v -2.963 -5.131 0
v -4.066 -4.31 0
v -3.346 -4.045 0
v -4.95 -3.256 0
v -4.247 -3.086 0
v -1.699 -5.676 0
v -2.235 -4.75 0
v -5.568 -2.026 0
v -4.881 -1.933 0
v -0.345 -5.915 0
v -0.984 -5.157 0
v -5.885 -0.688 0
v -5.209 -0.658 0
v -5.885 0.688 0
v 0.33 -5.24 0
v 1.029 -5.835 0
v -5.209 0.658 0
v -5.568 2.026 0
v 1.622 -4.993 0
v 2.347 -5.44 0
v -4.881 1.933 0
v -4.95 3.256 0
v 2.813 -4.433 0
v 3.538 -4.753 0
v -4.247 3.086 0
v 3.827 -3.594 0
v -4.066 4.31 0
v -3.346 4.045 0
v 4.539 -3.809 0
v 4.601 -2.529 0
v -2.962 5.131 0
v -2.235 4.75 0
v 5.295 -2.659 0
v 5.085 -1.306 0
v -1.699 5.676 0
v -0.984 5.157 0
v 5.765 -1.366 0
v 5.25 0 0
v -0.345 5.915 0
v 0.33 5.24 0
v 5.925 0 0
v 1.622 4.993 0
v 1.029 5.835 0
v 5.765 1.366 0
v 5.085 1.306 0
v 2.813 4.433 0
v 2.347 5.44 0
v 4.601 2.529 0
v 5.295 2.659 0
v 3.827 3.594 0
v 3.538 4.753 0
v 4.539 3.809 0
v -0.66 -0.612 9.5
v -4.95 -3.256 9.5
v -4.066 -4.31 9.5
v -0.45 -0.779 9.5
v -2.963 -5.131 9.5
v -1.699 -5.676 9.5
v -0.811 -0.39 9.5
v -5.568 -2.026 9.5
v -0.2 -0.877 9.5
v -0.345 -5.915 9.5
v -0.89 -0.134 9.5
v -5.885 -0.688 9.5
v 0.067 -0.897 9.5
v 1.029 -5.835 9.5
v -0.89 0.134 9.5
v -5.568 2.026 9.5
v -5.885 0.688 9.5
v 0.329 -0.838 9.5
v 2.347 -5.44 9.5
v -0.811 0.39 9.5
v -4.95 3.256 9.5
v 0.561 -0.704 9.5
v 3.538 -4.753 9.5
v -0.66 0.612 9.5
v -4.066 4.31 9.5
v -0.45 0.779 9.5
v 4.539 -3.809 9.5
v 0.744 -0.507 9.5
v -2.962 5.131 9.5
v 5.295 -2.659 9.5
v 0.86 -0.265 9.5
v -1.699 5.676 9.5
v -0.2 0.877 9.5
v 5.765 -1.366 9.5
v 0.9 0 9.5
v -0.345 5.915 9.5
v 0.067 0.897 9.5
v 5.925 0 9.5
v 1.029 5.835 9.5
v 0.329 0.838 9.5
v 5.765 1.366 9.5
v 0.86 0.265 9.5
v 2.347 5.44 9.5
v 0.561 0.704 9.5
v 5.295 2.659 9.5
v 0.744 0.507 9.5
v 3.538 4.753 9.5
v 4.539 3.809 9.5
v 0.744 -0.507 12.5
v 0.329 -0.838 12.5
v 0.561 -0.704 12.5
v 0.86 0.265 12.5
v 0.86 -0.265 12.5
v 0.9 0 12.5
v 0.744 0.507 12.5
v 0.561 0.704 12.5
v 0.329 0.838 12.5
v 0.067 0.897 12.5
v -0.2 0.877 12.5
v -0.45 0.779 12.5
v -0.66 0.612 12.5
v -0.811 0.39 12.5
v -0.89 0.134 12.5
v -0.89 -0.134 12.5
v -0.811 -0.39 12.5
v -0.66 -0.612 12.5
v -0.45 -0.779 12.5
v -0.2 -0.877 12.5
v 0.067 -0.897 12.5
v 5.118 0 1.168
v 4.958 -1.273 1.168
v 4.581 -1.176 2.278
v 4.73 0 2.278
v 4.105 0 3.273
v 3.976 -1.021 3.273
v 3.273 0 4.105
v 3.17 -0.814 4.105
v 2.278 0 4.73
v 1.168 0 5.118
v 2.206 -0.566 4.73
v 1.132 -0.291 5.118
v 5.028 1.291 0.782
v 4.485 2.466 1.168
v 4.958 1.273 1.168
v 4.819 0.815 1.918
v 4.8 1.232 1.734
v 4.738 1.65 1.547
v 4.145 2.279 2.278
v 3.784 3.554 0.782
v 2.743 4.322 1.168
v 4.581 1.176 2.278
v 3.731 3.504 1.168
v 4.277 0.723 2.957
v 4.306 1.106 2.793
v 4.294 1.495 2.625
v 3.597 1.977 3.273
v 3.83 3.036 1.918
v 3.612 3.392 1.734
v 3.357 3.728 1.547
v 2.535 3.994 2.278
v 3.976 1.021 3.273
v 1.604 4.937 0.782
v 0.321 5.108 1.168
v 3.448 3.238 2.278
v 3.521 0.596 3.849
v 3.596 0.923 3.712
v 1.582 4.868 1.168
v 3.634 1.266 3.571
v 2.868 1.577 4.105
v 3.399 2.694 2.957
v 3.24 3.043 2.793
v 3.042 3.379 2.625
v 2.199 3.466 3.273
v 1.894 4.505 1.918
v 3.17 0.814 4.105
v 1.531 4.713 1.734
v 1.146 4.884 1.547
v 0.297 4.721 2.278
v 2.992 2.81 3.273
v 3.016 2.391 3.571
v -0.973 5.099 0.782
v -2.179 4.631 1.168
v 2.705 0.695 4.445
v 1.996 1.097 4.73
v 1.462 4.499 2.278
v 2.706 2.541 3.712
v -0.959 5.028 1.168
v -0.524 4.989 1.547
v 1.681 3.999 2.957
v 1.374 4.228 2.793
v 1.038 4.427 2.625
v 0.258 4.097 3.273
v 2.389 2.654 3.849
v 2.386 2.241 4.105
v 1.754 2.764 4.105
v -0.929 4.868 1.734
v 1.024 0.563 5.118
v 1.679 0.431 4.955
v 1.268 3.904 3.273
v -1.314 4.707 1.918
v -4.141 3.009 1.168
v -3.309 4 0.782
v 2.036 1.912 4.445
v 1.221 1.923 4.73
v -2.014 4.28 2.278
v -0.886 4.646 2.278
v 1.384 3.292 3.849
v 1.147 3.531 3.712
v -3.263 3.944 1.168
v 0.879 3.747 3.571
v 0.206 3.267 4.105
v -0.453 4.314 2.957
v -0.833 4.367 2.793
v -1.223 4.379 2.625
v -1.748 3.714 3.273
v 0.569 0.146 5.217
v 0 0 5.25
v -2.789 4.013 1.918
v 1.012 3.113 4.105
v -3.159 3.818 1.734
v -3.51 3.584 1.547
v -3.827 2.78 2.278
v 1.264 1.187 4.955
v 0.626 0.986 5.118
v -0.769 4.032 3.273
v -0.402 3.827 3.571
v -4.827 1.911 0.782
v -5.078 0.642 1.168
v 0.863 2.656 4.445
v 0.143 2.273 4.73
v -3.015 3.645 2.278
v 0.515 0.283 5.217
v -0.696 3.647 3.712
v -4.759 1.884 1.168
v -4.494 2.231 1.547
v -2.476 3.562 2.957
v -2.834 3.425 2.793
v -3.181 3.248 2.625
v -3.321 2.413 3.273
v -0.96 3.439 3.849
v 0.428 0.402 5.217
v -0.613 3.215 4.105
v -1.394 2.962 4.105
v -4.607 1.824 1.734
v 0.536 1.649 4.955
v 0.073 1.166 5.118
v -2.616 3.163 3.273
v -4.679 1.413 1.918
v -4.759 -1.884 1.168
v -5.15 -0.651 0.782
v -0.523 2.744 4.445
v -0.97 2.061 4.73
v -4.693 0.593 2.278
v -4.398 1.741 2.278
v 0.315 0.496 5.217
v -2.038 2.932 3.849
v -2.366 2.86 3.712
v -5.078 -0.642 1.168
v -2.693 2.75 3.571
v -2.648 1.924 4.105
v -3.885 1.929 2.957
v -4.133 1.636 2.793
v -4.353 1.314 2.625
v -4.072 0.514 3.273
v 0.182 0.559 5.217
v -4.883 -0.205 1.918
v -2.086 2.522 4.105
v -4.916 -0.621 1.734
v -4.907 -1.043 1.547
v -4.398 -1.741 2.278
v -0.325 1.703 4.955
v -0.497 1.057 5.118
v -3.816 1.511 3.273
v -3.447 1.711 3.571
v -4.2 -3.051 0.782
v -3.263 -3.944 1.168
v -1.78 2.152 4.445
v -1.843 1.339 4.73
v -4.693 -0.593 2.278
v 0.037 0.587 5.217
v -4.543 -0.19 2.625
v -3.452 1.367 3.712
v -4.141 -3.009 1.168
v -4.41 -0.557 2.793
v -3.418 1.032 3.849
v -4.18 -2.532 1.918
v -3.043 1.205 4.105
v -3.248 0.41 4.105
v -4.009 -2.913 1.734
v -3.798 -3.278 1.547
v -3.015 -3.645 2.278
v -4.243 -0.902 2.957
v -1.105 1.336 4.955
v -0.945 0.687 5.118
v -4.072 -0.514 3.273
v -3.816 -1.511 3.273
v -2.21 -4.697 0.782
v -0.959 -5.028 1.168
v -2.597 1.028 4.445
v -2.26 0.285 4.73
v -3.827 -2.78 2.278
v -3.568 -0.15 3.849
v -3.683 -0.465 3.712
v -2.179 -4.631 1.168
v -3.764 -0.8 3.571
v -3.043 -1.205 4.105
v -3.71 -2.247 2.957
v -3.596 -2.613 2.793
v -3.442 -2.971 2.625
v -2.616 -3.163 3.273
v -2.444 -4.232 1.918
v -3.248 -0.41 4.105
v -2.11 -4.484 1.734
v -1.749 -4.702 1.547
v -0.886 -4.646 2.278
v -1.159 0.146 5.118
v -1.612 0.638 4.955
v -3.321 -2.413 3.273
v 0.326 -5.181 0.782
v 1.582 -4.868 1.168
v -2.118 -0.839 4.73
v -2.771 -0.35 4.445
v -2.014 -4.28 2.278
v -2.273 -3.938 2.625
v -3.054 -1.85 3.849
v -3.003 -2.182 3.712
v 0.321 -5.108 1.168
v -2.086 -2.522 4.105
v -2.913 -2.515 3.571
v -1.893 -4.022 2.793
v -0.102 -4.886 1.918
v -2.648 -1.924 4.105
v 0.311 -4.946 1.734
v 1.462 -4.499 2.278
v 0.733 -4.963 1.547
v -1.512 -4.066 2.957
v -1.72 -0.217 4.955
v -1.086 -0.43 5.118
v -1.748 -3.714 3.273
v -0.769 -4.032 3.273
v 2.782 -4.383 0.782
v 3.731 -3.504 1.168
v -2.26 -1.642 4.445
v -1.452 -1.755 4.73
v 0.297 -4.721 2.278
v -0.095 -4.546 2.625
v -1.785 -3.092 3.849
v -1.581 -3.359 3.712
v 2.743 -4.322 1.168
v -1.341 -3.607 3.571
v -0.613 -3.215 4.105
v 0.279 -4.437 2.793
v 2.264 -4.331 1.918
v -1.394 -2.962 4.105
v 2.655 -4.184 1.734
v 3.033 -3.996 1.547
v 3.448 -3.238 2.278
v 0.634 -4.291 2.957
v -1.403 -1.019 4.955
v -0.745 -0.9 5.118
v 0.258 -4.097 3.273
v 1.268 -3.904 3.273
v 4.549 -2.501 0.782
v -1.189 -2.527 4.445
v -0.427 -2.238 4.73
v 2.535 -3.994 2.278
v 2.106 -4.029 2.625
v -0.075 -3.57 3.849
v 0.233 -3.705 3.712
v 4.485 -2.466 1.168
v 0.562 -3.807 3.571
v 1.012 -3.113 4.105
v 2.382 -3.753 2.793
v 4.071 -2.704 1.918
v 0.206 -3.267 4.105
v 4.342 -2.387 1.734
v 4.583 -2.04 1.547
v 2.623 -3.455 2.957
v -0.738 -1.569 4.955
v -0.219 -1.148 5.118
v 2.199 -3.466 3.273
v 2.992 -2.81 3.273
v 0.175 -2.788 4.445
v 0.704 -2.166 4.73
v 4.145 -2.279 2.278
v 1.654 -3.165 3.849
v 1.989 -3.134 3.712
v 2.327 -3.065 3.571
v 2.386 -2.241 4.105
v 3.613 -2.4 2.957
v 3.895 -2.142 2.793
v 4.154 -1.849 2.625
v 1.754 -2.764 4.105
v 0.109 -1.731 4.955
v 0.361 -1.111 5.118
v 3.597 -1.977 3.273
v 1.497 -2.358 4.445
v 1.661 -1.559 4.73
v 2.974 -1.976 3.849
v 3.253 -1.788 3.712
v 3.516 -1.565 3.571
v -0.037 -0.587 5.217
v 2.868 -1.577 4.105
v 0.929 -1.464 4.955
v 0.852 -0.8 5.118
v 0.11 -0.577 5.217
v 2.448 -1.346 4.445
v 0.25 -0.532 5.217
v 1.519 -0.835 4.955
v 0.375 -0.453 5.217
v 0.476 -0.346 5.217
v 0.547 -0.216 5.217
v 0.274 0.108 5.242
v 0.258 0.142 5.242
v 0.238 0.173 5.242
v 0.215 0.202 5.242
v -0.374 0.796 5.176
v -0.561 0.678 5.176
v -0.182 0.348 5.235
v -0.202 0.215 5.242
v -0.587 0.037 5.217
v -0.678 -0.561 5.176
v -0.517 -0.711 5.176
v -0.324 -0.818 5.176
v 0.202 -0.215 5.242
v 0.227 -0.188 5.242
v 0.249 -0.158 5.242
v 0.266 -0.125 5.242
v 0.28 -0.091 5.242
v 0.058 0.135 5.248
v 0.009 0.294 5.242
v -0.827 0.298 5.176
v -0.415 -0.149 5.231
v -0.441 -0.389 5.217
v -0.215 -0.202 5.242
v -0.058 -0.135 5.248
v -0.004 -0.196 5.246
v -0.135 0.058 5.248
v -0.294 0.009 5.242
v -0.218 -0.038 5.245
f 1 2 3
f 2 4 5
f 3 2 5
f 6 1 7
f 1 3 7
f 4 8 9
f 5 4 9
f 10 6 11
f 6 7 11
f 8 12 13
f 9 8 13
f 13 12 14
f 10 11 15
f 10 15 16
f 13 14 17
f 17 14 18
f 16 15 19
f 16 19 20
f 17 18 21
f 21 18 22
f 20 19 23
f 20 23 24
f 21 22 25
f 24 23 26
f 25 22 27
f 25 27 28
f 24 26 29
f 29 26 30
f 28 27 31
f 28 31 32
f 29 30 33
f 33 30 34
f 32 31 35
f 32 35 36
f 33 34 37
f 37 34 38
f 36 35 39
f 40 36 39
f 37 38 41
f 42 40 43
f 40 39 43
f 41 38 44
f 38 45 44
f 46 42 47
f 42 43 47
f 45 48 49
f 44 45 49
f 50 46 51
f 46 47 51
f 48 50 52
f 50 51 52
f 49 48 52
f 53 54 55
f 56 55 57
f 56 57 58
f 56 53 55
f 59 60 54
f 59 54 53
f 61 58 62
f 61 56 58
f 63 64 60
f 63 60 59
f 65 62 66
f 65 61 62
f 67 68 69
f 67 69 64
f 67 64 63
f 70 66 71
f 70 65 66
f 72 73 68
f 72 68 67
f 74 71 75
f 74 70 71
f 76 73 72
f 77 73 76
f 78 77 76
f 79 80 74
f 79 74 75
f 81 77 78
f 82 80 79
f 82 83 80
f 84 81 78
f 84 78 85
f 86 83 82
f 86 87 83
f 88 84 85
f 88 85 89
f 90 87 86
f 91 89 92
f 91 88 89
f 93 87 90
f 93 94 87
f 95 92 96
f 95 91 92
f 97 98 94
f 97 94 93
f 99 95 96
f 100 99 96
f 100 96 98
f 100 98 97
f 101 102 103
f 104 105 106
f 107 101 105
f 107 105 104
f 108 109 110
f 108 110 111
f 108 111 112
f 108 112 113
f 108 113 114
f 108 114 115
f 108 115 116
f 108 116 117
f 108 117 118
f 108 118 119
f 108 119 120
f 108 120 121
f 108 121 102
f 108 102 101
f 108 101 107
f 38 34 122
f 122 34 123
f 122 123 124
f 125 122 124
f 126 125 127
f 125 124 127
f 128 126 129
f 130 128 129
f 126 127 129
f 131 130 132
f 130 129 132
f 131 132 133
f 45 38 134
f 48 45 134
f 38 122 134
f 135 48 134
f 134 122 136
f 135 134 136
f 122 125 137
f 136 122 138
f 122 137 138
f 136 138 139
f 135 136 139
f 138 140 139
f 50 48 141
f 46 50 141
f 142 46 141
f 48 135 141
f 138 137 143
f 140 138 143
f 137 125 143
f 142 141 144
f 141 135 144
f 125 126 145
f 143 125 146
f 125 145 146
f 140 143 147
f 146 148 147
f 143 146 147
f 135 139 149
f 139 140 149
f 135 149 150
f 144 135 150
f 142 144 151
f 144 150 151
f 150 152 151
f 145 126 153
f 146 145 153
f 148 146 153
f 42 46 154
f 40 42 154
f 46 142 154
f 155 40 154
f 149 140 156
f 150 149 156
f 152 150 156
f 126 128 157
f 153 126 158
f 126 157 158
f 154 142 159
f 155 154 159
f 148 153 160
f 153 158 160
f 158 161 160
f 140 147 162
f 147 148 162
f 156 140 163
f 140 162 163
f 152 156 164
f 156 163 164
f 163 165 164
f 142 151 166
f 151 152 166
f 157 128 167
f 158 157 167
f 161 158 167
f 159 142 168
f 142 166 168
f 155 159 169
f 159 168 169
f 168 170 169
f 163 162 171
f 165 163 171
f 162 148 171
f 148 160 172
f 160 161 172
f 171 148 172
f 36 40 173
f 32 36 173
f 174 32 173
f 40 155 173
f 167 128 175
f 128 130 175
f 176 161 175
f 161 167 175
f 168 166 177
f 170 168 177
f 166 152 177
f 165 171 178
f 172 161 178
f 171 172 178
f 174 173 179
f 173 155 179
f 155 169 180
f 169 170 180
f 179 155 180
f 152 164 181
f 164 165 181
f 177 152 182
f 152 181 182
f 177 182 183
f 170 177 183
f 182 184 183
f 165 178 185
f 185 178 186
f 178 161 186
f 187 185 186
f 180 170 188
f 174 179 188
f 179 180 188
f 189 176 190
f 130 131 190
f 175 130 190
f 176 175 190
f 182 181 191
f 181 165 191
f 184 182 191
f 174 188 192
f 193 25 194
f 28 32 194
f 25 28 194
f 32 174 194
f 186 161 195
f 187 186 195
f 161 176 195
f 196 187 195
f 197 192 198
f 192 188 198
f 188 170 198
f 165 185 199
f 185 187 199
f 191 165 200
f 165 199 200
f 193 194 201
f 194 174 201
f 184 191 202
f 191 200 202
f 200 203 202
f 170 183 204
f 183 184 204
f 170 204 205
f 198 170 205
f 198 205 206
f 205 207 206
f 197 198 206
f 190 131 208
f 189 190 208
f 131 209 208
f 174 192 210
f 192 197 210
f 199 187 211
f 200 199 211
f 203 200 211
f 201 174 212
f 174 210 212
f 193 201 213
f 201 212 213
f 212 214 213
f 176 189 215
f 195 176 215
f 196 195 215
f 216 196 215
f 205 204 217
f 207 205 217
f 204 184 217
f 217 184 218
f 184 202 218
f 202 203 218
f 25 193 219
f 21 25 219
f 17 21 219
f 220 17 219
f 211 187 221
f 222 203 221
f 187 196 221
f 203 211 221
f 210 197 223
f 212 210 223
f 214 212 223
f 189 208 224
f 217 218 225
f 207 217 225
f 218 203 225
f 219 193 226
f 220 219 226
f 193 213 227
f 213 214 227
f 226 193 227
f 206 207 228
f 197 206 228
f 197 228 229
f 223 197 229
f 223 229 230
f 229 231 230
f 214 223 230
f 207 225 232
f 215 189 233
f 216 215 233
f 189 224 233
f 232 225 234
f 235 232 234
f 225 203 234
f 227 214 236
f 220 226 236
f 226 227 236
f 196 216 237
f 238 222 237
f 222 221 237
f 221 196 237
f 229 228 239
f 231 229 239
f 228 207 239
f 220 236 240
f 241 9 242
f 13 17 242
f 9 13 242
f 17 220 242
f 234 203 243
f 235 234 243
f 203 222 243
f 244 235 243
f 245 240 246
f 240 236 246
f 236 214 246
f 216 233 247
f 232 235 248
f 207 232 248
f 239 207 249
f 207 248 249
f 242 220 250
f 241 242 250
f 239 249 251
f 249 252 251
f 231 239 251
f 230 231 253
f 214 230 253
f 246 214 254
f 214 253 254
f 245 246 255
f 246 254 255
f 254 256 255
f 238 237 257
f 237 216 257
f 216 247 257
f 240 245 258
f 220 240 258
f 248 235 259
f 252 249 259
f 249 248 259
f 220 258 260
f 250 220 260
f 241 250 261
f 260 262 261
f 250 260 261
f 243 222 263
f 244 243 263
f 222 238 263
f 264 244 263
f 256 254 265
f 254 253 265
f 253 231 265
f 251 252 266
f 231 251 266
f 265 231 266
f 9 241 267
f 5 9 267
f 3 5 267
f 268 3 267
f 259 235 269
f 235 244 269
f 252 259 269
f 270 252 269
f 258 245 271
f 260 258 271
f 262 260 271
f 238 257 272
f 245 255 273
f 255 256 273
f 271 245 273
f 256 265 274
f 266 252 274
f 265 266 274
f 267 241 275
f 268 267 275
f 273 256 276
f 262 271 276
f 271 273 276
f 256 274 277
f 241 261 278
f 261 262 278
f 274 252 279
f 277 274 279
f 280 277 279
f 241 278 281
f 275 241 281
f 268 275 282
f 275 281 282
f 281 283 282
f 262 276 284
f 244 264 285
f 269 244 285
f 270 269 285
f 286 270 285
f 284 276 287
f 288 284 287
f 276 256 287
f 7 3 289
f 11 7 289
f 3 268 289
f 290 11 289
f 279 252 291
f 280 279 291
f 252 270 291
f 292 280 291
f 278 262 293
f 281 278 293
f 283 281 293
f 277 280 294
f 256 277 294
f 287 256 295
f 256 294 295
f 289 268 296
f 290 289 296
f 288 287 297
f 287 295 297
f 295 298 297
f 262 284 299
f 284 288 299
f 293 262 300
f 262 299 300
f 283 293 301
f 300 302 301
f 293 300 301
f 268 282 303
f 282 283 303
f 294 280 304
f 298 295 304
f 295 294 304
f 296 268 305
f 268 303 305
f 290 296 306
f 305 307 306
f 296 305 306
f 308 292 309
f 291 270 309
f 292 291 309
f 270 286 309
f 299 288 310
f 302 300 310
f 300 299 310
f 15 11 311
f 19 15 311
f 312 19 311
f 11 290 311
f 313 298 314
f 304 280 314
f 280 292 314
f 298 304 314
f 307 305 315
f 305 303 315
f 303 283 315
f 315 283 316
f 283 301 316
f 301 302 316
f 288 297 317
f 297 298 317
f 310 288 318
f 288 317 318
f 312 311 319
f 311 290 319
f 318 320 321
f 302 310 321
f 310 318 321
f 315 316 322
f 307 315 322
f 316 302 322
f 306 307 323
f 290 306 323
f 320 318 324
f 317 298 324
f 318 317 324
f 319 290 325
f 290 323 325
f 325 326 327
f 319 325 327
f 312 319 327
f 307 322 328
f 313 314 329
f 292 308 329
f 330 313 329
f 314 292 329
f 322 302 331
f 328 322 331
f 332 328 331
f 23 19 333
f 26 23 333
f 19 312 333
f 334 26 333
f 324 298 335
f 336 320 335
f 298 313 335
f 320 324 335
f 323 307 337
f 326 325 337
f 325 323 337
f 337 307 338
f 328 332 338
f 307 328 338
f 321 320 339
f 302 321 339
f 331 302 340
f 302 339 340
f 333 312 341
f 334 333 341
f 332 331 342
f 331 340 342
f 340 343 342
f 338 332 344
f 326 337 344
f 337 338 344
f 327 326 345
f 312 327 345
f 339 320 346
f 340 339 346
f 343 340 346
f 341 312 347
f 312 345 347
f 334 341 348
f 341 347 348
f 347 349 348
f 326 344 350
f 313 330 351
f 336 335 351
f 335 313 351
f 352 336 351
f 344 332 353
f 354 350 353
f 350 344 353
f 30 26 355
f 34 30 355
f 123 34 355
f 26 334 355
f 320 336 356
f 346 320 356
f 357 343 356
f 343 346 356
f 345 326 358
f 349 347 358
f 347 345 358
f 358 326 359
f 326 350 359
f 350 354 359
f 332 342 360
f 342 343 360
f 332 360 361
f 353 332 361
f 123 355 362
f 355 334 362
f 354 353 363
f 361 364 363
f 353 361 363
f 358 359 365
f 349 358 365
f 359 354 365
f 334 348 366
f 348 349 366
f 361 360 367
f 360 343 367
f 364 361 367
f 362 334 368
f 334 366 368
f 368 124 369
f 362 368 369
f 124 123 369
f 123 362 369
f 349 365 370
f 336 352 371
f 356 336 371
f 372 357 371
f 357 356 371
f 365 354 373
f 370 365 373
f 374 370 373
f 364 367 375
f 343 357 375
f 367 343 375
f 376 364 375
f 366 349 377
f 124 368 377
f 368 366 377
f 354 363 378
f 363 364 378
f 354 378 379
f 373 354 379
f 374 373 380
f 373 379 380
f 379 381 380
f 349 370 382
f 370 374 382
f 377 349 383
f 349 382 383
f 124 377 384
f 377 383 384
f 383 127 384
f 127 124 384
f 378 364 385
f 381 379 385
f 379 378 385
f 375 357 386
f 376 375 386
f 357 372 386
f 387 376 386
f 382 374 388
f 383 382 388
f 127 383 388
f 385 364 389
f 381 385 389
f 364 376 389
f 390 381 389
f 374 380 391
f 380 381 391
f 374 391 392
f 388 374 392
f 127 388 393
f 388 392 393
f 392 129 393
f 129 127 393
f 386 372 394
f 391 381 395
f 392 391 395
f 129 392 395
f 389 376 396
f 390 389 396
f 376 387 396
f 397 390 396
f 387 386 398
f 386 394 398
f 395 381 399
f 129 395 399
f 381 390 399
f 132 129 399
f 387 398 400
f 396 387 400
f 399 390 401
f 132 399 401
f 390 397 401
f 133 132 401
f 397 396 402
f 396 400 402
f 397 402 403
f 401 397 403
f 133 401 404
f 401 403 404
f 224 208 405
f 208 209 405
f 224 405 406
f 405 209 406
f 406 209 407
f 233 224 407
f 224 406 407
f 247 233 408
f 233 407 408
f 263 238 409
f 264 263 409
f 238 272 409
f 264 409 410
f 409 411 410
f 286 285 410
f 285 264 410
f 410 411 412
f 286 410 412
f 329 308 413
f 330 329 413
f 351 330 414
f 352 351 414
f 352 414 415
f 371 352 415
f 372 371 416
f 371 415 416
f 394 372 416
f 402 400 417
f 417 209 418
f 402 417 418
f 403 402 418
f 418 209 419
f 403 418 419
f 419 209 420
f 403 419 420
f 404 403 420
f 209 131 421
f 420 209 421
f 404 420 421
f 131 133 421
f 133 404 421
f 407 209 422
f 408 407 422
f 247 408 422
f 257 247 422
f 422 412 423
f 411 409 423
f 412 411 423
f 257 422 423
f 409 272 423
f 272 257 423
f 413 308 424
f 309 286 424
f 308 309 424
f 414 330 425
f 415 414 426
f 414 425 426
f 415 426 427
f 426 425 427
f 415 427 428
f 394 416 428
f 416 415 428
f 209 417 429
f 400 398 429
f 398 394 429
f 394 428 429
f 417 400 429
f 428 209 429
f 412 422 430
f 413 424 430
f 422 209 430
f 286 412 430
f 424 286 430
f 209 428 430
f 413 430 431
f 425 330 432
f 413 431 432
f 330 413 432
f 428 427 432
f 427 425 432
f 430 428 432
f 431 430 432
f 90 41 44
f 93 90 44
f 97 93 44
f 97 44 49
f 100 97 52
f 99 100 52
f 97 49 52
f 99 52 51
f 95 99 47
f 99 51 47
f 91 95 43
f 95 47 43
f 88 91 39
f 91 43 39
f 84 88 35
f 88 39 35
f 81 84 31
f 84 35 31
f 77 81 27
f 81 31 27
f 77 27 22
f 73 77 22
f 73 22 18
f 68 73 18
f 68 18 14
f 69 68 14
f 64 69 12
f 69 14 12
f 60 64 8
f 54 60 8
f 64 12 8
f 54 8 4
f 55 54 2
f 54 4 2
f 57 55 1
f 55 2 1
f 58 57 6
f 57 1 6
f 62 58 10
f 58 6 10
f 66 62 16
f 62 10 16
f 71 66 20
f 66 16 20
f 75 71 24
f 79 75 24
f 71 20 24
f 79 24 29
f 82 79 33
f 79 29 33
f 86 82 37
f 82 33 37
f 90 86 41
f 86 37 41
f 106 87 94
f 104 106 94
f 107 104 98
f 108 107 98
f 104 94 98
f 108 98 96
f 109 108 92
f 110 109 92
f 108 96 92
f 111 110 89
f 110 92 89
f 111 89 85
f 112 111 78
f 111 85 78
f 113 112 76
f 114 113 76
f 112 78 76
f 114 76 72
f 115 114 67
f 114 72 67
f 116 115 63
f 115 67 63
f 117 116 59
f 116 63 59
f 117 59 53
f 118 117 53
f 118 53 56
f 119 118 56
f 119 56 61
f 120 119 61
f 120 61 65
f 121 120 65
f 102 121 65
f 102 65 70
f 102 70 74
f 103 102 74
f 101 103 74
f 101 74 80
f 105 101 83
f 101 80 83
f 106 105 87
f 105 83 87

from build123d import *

# Parameters (mm, degrees)
F0_R     = 5.925
F1_DEPTH = 9.5
F2_R     = 0.9
F3_DEPTH = 3


with BuildPart() as f1:
    # F0 (on Top) → F1 (new body)
    with BuildSketch(Plane.XY):
        Circle(F0_R)
    extrude(amount=F1_DEPTH)

    # F2 (on face) → F3 (join)
    with BuildSketch(Plane.XY.offset(9.5)):
        Circle(F2_R)
    extrude(amount=F3_DEPTH)

    # F4 (on Front) → F5 (revolve, cut)
    with BuildSketch(Plane.XZ):
        with BuildLine():
            Line((0, 0), (5.25, 0))
            ThreePointArc((5.25, 0), (3.712311, 3.712311), (0, 5.25))
            Line((0, 5.25), (0, 0))
        make_face()
    revolve(axis=Axis((0, 0, 7.387147), (0, 0, 1)), mode=Mode.SUBTRACT)


solid = f1.part
